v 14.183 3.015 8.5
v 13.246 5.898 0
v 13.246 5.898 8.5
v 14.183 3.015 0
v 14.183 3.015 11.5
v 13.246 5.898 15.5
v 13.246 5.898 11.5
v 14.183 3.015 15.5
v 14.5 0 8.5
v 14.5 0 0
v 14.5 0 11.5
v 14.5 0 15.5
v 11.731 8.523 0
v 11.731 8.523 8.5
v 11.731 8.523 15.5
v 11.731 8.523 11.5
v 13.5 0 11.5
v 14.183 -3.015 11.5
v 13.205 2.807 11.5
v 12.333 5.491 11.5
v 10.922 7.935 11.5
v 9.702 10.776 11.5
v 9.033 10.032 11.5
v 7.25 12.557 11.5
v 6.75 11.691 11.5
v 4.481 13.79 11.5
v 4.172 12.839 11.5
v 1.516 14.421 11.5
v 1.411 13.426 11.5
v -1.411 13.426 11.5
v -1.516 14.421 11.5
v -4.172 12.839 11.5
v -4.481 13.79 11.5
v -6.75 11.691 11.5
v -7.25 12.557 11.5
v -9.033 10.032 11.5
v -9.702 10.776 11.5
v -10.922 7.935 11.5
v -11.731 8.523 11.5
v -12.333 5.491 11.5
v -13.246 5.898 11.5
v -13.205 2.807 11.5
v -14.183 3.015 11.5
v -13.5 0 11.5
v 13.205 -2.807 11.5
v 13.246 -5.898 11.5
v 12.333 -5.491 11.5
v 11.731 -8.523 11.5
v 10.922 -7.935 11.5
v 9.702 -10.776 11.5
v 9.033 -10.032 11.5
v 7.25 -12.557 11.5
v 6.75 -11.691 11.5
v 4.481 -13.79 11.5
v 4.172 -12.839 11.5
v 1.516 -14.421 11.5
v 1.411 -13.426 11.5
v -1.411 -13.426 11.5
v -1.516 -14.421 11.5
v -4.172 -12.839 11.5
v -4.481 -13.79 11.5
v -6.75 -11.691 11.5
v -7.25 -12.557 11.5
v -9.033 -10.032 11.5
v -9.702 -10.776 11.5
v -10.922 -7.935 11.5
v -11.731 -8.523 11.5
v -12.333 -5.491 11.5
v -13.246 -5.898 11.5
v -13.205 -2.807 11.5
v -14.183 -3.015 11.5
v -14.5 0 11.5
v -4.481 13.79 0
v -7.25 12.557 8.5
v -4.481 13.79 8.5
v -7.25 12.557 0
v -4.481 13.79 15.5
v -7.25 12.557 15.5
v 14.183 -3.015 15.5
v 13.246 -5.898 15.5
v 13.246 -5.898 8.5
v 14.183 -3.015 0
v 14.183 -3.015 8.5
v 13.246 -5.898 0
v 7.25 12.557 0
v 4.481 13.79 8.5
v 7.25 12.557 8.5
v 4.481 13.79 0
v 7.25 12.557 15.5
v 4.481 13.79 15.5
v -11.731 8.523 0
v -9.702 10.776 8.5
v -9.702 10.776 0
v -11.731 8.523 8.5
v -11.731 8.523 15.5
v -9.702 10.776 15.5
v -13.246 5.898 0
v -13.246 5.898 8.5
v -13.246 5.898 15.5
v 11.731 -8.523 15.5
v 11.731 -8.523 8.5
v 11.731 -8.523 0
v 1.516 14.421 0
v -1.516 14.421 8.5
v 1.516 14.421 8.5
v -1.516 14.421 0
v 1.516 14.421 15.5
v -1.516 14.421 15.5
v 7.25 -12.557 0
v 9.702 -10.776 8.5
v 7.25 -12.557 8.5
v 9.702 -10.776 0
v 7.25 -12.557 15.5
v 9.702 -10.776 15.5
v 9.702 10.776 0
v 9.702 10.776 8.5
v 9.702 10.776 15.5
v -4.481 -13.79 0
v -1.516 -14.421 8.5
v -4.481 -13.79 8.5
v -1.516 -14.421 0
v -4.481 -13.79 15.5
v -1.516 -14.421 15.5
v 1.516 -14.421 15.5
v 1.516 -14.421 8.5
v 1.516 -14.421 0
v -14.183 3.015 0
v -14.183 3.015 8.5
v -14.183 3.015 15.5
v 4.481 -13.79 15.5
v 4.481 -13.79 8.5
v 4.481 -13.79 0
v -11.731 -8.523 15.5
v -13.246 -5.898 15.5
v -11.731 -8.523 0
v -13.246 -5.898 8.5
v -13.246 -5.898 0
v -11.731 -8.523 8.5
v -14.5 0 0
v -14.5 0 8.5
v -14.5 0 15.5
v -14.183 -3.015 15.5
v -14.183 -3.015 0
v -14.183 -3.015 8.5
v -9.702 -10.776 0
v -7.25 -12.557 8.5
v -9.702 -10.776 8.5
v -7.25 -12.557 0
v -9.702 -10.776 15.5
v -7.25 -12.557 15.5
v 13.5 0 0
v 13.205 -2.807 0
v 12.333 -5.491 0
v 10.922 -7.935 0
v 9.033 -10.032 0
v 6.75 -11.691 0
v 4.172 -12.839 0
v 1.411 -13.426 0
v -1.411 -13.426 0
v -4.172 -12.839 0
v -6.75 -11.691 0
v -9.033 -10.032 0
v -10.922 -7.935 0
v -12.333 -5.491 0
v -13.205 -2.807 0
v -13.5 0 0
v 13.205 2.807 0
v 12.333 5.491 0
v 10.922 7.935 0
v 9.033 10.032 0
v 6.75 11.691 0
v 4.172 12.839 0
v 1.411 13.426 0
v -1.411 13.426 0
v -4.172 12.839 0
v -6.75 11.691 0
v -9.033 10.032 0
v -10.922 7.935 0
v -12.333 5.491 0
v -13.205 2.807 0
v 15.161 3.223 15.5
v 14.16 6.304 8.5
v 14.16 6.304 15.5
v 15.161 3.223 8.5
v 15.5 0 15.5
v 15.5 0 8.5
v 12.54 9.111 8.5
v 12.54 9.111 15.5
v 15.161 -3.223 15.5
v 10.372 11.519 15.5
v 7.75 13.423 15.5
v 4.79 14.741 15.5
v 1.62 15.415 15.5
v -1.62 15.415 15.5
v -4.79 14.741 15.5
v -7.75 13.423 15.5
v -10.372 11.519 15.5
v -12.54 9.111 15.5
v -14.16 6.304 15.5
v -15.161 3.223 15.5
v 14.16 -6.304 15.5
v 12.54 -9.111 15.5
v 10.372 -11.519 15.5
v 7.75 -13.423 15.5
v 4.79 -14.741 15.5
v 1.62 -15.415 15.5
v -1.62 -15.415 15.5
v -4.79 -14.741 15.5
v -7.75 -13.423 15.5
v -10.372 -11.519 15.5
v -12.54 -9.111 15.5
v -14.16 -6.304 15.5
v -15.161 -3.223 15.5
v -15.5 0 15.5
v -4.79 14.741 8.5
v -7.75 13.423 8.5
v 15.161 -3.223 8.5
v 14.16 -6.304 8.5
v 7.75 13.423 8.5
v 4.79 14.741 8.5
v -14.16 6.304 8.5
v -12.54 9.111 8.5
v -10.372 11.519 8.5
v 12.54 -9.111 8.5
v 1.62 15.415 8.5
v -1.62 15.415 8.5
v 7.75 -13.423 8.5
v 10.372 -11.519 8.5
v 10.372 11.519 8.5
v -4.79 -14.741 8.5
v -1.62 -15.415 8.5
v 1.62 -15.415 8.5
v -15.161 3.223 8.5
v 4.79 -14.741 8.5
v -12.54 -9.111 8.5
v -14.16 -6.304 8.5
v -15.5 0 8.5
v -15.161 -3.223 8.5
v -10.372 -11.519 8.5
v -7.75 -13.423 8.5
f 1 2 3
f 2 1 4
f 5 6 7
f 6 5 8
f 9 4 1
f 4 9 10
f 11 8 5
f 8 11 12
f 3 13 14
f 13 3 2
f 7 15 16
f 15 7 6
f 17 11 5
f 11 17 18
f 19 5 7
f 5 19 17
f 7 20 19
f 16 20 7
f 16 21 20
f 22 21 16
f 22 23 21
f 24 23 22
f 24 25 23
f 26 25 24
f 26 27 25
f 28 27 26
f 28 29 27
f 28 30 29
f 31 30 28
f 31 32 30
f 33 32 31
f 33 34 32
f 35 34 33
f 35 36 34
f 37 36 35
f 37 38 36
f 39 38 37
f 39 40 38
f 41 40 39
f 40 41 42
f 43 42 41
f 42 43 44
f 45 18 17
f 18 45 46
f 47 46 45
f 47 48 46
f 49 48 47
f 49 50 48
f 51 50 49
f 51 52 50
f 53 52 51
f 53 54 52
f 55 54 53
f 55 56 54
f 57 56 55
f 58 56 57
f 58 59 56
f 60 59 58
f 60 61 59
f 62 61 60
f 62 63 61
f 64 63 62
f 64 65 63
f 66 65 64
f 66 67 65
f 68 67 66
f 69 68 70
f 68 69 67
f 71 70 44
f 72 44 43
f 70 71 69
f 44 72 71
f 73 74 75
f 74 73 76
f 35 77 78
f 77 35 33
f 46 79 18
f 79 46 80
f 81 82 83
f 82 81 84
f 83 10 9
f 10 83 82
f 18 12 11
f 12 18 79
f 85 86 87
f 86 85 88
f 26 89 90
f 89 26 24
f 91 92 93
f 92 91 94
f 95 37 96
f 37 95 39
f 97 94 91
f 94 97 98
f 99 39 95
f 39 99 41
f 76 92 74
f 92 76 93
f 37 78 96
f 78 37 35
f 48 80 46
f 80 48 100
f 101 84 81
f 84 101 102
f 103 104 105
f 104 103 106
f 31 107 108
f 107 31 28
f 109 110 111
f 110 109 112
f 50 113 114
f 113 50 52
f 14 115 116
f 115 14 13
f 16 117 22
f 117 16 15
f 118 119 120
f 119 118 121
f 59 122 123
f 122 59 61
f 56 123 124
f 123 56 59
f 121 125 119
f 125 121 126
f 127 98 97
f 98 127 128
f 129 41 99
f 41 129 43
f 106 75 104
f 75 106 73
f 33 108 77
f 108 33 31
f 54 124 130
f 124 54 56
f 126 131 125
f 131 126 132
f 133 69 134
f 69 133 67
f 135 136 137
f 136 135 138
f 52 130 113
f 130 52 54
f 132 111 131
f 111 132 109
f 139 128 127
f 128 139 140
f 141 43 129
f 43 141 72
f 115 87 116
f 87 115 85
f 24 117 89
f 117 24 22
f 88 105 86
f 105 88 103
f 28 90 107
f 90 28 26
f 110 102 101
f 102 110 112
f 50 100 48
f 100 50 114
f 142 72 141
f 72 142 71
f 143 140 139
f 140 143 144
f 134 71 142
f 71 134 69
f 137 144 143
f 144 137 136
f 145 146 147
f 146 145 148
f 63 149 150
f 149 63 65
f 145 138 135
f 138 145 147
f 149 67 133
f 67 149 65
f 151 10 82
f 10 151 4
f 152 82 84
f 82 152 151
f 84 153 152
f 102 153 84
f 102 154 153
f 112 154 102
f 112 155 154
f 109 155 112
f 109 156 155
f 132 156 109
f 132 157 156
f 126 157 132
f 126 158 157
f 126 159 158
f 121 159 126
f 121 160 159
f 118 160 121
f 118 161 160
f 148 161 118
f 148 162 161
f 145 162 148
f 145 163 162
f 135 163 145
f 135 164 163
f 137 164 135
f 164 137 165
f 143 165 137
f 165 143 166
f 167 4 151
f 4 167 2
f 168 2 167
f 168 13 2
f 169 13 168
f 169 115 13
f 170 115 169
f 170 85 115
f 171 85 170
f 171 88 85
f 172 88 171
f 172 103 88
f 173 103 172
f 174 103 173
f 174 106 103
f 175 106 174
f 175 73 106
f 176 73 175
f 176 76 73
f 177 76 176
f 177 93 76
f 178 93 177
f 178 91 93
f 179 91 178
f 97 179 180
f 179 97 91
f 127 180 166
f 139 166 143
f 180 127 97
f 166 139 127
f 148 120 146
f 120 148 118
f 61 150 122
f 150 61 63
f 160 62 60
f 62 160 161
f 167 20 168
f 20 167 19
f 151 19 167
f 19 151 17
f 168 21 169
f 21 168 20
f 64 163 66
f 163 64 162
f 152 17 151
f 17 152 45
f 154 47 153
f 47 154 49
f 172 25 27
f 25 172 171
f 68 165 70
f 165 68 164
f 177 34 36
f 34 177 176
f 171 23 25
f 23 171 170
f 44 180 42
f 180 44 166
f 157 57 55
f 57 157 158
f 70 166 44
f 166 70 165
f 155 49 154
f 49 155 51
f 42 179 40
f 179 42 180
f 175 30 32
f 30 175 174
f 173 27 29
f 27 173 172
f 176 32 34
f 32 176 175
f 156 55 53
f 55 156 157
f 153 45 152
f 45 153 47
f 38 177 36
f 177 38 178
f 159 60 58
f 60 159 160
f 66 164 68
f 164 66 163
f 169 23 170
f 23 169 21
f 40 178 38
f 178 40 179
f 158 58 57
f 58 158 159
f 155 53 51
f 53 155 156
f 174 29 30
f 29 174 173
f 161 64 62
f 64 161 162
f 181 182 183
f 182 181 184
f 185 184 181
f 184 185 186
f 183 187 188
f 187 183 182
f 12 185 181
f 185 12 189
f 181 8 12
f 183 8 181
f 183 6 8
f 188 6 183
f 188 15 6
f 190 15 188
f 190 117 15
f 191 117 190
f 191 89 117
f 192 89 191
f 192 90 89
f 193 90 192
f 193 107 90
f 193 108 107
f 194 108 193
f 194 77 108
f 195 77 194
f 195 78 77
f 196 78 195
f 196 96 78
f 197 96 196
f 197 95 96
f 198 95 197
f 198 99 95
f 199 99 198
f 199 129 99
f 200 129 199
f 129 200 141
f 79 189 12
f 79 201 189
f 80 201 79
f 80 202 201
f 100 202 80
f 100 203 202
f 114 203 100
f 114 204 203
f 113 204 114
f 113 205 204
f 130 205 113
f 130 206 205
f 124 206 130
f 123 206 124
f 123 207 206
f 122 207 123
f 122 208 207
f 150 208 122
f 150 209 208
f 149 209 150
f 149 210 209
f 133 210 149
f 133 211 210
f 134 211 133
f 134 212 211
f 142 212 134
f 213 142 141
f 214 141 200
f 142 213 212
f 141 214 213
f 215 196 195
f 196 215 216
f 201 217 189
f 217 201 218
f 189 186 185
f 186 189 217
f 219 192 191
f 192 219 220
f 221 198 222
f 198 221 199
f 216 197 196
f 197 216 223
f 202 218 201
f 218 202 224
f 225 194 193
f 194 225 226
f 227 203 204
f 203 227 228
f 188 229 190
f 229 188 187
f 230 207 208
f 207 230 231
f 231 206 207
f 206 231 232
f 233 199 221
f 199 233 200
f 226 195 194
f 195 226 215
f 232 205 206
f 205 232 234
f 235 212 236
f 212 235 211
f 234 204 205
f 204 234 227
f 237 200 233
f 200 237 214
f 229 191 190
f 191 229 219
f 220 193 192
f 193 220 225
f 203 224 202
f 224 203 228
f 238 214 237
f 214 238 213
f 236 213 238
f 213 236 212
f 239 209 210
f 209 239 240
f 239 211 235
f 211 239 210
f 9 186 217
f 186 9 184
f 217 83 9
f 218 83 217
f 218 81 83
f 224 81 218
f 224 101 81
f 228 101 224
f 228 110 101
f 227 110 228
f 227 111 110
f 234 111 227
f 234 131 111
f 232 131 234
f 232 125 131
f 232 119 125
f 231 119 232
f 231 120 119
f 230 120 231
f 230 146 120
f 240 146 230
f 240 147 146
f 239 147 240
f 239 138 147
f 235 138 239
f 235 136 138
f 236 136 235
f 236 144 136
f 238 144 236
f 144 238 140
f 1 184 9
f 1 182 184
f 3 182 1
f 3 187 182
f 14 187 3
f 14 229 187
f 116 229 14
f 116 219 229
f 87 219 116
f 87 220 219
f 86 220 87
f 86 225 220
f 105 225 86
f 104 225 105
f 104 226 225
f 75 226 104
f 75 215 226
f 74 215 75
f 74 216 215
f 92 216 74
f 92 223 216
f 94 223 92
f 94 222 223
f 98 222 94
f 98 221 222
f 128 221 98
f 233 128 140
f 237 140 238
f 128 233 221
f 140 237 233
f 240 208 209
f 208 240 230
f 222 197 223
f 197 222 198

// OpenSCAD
// file: ../shape_primitives.scad
module donut(r_o, r_i, h, $fn, center=false) {
  difference() {
    cylinder(r=r_o, h=h, $fn=$fn, center=center);
    translate([0, 0, -.5])
    cylinder(r=r_i, h=h+1, $fn=$fn, center=center);
  }
}

module cone_hollow(r1, r2, h) {
  /* make a hollow cone of height h.
   * r1 and r2 are both arrays of form: [outer_radius, inner_radius]
   */
  difference() {
    cylinder(r1=r1[0], r2=r2[0], h=h);
    cylinder(r1=r1[1], r2=r2[1], h=h);
    translate([0, 0, -.5])
    cylinder(r=r1[1], h=1);
    translate([0, 0, h-.5])
    cylinder(r=r2[1], h=1);
  }
}
// main file
use <../shape_primitives.scad>
cutout = 6; // extra dimensions to make clear difference() operations


////////////////////////
// NEON light
////////////////////////
neon_r_o = 29/2;
pi = 3.14159;

module neon_spacer() {
  r_o1 = neon_r_o;
  r_i1 = 24/2;
  h1 = 5;
  r_o2 = 32/2;
  r_i2 = r_o2 - 5;
  h2 = 10;
  h_overlap = 3;
  $fn=50;

  donut(r_o1, r_i1, h1+h_overlap, $fn);
  translate([0, 0, h1])
    donut(r_o2, r_o1, h2, $fn);
}
/*neon_spacer();*/

module neon_dichroic_filter_spacer() { // make me
  // measured vars
  r_lense = 29/2;
  r_lense_lip = 1;  // section that holds filter
  wall_thickness = 1;
  h_total = 15.5;
  h_lense = 2;
  // derived vars
  r_i = r_lense - r_lense_lip;
  r_o = r_lense + wall_thickness;
  lense_inset = 2 * h_lense;

  $fn = 90;

  donut(r_lense, r_i, h_total - lense_inset, $fn);
  translate([0, 0, h_total - lense_inset - 3])
  donut(r_o, r_lense, lense_inset + 3, $fn);
}
neon_dichroic_filter_spacer();

module neon_module() {
  r_o = neon_r_o;
  r_wireshaft = 2;
  y_groovemount = 2.5;
  x_groovemount = 1.5;
  x_offset_groovemount = 6/2;
  angle = 360 * x_offset_groovemount / (pi * 2*r_o);
  h = 18;

  difference() {
    cylinder(r=r_o, h=h, $fn=50);

    // part for wires
    translate([r_o, 0, 0])
      cylinder(r=r_wireshaft, h=h+cutout);
    translate([-r_o, 0, 0])
      cylinder(r=r_wireshaft, h=h+cutout);

    // part to attach into flashlight
    #translate([0, r_o - y_groovemount, 0])
      cube([x_groovemount, y_groovemount, h+cutout]);
    #rotate([0,0,angle])translate([0, -r_o, 0])
      cube([x_groovemount, y_groovemount, h+cutout]);
    #rotate([0,0,-angle])translate([0, -r_o, 0])
      cube([x_groovemount, y_groovemount, h+cutout]);
  }
}

/*$fn=20;*/
/*translate([20 + 2*neon_r_o, 0, 0])*/
  /*neon_spacer();*/
/*neon_module();*/
